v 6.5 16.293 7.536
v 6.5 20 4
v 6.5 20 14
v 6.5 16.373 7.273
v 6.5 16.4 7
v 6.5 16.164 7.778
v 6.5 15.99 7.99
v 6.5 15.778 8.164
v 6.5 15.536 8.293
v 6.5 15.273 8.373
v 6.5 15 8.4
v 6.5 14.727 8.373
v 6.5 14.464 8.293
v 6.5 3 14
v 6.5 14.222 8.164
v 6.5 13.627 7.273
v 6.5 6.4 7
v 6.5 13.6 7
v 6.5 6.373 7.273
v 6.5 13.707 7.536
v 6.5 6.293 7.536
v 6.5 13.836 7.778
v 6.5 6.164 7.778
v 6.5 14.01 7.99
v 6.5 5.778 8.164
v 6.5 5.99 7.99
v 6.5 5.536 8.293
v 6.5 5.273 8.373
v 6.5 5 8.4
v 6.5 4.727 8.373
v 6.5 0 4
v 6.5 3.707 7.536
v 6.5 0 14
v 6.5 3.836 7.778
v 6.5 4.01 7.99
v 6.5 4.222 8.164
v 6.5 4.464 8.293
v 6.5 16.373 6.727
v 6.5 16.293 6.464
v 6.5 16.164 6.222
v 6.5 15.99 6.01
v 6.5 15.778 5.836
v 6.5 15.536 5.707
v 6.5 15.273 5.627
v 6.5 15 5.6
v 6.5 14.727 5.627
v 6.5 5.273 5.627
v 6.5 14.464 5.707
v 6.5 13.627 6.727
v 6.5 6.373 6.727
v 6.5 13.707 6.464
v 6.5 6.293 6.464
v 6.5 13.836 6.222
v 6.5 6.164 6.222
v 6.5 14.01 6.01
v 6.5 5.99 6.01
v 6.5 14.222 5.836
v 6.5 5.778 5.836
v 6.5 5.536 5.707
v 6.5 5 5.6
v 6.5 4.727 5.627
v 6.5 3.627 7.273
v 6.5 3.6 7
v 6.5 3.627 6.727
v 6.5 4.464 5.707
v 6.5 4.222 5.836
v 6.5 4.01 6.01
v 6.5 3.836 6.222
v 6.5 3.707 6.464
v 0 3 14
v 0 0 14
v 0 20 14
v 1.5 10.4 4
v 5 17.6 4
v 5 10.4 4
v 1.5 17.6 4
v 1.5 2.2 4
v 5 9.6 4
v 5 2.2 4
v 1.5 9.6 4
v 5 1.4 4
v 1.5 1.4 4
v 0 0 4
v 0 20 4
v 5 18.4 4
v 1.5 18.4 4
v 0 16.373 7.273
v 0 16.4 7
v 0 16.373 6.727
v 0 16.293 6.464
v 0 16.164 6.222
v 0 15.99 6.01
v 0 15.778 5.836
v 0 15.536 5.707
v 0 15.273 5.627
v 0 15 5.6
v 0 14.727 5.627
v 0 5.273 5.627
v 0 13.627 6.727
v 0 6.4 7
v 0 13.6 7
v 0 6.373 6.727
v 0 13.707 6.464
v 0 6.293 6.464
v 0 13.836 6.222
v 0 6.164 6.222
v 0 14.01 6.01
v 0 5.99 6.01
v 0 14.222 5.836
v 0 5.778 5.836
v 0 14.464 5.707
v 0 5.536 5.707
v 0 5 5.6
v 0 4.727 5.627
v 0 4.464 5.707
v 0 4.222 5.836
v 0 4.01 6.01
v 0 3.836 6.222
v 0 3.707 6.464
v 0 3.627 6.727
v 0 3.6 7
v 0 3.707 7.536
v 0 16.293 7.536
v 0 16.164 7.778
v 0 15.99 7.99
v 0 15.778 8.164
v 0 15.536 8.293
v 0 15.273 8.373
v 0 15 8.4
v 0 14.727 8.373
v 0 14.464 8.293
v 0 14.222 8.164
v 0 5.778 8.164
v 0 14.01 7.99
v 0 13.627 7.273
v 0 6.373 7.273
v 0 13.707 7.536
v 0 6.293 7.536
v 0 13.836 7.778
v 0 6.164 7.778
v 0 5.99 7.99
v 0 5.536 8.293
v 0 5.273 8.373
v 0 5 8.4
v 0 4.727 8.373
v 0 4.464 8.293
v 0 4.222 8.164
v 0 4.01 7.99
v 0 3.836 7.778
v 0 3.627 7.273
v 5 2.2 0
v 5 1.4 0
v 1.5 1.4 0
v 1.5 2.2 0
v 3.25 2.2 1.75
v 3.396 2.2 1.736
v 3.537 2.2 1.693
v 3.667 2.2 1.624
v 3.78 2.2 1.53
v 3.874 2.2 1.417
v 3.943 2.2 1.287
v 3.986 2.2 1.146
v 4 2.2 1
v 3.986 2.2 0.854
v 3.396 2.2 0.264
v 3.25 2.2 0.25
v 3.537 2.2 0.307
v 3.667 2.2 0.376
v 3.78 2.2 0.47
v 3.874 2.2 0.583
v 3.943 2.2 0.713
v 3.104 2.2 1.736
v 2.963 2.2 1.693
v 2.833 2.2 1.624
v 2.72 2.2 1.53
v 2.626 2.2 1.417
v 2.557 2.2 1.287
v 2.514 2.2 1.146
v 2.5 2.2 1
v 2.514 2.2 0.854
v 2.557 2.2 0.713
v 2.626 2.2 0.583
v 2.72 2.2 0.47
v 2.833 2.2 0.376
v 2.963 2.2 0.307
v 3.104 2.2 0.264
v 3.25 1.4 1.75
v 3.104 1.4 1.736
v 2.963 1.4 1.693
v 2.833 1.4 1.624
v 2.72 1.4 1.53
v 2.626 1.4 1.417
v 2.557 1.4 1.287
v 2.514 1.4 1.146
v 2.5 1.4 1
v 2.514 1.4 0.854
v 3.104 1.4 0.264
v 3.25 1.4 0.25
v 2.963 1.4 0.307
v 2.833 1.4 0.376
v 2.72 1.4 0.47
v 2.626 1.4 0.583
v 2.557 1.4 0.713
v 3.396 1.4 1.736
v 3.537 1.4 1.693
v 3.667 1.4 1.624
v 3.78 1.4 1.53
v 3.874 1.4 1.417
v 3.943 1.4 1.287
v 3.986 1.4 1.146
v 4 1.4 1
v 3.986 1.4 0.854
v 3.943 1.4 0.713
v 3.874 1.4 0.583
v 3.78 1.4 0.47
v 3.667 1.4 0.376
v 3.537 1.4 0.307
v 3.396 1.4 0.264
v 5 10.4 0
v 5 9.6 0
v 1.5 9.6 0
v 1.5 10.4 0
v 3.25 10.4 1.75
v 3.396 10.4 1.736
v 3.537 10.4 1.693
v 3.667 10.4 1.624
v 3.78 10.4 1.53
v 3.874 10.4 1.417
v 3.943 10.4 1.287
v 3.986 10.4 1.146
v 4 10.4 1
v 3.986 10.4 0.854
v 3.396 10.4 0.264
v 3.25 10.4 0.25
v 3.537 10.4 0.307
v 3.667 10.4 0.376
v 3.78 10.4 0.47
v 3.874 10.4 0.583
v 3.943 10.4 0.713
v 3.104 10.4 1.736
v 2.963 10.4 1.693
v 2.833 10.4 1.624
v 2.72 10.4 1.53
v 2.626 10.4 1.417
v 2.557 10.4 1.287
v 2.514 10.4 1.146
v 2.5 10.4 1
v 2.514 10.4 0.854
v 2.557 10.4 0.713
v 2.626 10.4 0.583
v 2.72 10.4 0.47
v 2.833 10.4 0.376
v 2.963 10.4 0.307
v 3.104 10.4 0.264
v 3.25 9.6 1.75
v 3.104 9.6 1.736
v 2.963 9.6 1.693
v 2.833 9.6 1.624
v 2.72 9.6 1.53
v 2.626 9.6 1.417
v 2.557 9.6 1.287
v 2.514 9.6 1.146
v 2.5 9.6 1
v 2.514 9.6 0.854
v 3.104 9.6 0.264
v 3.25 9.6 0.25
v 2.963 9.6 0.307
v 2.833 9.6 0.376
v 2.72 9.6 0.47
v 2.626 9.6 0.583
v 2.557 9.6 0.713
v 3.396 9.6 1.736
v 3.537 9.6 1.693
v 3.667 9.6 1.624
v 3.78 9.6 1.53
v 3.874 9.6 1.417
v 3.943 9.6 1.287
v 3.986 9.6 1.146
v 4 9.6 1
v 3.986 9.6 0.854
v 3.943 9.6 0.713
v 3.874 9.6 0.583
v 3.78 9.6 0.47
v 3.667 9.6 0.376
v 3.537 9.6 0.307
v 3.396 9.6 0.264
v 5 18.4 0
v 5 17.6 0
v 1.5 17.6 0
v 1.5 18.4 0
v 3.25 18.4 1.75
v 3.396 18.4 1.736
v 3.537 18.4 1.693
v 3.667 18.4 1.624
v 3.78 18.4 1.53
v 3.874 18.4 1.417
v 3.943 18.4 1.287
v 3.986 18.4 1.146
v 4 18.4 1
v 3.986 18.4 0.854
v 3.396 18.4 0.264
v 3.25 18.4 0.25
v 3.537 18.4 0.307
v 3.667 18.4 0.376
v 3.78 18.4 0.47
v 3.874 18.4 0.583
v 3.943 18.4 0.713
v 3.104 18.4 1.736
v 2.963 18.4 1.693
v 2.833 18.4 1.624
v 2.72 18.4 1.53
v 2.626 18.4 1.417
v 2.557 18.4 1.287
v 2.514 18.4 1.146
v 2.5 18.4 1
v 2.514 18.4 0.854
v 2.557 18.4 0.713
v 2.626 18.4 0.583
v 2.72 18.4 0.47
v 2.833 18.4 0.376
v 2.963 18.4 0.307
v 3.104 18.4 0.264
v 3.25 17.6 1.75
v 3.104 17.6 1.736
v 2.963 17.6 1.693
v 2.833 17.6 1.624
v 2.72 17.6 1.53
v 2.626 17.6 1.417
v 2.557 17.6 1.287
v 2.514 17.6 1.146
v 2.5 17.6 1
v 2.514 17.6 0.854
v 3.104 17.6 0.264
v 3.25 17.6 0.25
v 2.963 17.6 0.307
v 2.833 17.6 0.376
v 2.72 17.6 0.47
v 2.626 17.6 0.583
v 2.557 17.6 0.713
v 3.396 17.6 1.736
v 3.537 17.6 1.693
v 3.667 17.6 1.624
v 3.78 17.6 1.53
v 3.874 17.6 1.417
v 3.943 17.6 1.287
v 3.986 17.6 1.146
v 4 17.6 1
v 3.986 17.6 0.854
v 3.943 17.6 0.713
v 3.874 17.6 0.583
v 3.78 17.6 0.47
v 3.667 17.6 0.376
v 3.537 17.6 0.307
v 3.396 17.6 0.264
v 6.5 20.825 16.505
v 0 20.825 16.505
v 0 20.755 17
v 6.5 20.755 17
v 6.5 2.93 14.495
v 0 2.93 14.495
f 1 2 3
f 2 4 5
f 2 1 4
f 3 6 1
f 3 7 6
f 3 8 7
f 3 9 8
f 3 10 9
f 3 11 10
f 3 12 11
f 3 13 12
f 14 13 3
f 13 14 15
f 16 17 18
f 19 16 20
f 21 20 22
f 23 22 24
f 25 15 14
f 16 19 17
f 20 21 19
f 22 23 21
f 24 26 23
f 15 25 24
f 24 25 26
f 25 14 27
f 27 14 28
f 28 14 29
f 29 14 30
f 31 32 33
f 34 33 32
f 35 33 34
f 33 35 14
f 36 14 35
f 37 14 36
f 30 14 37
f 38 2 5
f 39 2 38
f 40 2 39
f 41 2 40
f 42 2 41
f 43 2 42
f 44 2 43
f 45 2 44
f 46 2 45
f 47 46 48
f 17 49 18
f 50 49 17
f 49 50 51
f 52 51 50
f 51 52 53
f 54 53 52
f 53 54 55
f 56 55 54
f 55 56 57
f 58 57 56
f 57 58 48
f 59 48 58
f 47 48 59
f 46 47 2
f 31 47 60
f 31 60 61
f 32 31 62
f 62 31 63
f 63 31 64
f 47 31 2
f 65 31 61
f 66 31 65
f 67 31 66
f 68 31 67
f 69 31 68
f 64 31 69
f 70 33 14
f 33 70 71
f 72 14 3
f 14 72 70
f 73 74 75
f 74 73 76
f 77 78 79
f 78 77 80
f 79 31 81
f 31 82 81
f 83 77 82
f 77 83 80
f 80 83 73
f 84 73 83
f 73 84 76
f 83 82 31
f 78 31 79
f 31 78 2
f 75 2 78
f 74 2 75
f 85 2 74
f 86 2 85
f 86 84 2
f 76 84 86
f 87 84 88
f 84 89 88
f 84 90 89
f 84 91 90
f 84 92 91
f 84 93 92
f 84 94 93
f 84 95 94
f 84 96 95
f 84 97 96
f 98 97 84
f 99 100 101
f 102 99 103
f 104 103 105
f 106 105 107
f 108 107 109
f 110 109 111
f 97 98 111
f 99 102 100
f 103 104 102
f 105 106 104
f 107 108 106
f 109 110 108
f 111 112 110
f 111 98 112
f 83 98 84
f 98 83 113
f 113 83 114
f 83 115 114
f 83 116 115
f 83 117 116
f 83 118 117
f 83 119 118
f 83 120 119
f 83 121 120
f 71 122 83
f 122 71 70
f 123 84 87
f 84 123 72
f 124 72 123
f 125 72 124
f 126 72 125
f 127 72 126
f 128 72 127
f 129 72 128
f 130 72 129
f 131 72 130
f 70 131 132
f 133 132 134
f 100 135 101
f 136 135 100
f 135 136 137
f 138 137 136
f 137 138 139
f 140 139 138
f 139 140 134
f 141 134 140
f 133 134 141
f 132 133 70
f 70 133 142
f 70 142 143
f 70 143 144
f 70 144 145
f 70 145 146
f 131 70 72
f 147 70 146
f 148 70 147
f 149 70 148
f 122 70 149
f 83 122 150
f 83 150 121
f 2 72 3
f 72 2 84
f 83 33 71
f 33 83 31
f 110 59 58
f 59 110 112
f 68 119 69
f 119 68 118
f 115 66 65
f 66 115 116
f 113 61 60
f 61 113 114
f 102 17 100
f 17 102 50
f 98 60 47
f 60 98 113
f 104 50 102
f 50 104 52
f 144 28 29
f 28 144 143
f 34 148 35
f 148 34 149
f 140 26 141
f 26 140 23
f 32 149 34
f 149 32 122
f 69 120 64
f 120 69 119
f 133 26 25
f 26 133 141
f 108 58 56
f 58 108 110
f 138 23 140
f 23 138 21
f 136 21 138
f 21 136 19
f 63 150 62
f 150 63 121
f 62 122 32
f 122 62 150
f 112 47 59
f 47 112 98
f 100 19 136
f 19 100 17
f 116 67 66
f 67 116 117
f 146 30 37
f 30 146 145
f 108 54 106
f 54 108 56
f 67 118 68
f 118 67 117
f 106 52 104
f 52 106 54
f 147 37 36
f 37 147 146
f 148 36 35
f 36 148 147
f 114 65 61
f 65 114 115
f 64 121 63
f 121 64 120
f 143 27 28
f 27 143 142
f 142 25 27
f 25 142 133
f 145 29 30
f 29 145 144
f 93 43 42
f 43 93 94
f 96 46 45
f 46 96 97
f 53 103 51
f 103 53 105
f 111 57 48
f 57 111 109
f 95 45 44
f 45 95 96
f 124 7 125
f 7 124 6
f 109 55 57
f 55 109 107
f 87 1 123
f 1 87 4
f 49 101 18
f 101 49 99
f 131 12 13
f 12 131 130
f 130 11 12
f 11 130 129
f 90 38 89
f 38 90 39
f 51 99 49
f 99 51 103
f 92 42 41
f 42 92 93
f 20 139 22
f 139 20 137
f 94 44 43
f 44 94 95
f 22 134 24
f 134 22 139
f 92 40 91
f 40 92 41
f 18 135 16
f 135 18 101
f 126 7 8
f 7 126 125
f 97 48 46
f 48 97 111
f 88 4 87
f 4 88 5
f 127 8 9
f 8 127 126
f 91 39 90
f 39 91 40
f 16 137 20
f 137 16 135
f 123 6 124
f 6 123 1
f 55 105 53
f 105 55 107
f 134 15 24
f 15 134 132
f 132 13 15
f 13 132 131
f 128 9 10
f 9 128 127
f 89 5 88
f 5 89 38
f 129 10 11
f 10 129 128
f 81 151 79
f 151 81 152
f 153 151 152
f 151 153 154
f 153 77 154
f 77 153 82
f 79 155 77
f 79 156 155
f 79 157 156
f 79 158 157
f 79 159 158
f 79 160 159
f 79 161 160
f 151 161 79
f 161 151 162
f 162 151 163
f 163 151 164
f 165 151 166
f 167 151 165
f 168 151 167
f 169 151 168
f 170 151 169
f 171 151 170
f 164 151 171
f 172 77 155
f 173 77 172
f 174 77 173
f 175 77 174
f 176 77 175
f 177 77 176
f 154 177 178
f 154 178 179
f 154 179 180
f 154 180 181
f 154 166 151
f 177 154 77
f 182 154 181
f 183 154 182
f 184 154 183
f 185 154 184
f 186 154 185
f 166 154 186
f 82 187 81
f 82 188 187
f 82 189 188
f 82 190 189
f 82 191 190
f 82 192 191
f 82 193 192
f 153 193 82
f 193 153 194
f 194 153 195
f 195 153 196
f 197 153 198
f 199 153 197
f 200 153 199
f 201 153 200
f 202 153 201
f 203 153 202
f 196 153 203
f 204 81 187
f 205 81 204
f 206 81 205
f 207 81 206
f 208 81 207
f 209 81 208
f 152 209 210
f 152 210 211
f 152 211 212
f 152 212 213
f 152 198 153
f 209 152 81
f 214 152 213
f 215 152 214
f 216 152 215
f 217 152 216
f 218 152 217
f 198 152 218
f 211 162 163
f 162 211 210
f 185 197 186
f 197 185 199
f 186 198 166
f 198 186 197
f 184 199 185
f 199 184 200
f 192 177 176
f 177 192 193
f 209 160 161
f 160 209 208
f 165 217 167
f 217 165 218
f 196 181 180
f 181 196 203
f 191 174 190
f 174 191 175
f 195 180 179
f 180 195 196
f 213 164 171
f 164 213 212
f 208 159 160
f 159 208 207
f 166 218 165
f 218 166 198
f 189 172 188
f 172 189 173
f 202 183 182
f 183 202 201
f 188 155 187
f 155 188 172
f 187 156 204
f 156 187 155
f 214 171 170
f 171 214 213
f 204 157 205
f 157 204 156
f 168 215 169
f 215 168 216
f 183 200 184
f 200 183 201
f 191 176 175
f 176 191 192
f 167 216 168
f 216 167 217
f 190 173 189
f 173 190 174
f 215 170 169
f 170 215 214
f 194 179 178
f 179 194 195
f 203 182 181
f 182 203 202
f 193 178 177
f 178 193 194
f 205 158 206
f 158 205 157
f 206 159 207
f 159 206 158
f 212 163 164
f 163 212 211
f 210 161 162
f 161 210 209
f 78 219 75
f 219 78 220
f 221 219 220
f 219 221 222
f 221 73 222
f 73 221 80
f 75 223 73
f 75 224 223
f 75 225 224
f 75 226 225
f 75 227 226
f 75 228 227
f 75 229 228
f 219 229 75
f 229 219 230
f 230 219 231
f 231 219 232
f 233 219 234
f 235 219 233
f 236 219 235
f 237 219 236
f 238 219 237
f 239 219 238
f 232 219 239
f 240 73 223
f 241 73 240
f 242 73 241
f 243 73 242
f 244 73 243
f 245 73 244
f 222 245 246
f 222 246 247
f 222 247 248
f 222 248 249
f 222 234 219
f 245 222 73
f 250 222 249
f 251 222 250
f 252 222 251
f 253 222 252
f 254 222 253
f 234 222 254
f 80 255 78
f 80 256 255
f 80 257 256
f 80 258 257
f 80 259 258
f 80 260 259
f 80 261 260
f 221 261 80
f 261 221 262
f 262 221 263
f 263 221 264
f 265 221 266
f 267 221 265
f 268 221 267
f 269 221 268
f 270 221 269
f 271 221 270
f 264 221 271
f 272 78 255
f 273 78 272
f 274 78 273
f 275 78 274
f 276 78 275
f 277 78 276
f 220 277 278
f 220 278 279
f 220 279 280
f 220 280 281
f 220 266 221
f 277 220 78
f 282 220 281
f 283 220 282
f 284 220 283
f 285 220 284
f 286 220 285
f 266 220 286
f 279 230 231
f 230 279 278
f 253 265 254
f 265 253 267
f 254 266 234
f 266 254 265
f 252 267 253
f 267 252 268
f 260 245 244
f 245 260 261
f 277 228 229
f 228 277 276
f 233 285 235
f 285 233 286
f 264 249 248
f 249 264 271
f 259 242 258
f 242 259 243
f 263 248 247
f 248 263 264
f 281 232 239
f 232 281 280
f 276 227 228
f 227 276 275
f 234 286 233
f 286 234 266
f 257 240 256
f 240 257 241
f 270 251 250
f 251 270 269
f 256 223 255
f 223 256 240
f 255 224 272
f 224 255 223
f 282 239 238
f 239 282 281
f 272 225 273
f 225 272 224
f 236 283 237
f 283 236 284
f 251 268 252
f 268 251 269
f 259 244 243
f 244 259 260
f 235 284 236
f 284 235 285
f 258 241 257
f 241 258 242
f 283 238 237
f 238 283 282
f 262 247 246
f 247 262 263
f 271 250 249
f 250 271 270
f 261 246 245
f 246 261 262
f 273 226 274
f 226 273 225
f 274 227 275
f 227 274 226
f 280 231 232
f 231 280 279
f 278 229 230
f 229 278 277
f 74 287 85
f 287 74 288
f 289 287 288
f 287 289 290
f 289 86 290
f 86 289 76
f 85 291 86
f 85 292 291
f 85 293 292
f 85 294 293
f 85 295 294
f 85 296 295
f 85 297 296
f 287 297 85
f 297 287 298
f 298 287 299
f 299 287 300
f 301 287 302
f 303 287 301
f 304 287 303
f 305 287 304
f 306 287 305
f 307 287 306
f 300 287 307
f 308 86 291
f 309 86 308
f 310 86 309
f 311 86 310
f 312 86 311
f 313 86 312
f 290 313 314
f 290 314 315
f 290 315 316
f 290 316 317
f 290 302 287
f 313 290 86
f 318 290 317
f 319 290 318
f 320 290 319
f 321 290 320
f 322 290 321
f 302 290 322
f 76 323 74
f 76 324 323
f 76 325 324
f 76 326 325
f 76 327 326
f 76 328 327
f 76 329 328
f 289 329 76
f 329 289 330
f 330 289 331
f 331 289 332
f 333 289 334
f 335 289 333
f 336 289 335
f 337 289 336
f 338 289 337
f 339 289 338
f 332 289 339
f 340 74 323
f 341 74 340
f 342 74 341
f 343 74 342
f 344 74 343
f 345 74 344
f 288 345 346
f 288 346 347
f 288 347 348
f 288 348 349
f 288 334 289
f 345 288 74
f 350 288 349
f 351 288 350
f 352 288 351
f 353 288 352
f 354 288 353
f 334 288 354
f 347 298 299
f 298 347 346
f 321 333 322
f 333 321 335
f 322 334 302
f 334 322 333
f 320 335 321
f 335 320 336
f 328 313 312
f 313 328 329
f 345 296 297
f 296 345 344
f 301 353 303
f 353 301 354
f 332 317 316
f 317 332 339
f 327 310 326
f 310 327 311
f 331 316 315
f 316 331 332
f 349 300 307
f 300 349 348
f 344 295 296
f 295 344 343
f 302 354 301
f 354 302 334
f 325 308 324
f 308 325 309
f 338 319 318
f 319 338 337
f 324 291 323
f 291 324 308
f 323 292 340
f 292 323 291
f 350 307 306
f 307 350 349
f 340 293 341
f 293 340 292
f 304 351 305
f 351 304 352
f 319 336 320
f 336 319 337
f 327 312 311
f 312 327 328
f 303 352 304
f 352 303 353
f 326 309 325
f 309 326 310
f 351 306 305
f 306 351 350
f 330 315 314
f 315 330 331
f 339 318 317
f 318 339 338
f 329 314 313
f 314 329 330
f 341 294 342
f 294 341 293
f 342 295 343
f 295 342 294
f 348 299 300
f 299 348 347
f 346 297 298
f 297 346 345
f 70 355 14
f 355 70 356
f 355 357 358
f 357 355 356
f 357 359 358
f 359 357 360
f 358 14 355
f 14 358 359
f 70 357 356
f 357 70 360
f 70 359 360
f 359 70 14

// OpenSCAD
microButton();

_buttonLength = 10;
_buttonWidth = 20;
_buttonDepth = 6.5;
_pinLength = 4;
_pinWidth = 0.8;
_pinDepth = 3.5;

// ---------------------------------------------------------------------------------

function getButtonLength() = _buttonLength;
function getButtonWidth() = _buttonWidth;
function getButtonDepth() = _buttonDepth;

function getPinLength() = _pinLength;

// ---------------------------------------------------------------------------------


module microButton(
    buttonLength = 10,
    buttonWidth = 20,
    buttonDepth = 6.5,
    pinLength = 4,
    pinWidth = 0.8,
    pinDepth = 3.5,
    polygons = 32
) {
    union() {    
        translate([0,0,pinLength])
        color("blue")
        difference() {
            cube([buttonDepth,buttonWidth,buttonLength]);
            
            translate([-1,5,3])
            rotate([0,90,0])
            cylinder(d=2.8 ,h=buttonDepth+5, $fn=polygons);
            
            translate([-1,buttonWidth-5,3])
            rotate([0,90,0])
            cylinder(d=2.8 ,h=buttonDepth+5, $fn=polygons);
        }
        // 3 pins
        translate([(buttonDepth-pinDepth)/2,1+pinWidth/2,0])
        color("darkgrey")
        difference() {
            cube([pinDepth,pinWidth,pinLength]);
            translate([pinDepth/2,-0.1,1])
            rotate([0,90,90])
            cylinder(d=1.5 ,h=pinWidth+0.2, $fn=polygons);
        }
        translate([(buttonDepth-pinDepth)/2,buttonWidth/2 - pinWidth/2,0])
        color("darkgrey")
        difference() {
            cube([pinDepth,pinWidth,pinLength]);
            translate([pinDepth/2,-0.1,1])
            rotate([0,90,90])
            cylinder(d=1.5 ,h=pinWidth+0.2, $fn=polygons);
        }
        
        translate([(buttonDepth-pinDepth)/2,buttonWidth-(2+pinWidth/2),0])
        color("darkgrey")
        difference() {
            cube([pinDepth,pinWidth,pinLength]);
            translate([pinDepth/2,-0.1,1])
            rotate([0,90,90])
            cylinder(d=1.5 ,h=pinWidth+0.2, $fn=polygons);
        }
        
        // aktuator
        translate([0,3,buttonLength+pinLength])
        color("grey")
        rotate([8,0,0])
        cube([buttonDepth,18,0.5]);
    }
}
